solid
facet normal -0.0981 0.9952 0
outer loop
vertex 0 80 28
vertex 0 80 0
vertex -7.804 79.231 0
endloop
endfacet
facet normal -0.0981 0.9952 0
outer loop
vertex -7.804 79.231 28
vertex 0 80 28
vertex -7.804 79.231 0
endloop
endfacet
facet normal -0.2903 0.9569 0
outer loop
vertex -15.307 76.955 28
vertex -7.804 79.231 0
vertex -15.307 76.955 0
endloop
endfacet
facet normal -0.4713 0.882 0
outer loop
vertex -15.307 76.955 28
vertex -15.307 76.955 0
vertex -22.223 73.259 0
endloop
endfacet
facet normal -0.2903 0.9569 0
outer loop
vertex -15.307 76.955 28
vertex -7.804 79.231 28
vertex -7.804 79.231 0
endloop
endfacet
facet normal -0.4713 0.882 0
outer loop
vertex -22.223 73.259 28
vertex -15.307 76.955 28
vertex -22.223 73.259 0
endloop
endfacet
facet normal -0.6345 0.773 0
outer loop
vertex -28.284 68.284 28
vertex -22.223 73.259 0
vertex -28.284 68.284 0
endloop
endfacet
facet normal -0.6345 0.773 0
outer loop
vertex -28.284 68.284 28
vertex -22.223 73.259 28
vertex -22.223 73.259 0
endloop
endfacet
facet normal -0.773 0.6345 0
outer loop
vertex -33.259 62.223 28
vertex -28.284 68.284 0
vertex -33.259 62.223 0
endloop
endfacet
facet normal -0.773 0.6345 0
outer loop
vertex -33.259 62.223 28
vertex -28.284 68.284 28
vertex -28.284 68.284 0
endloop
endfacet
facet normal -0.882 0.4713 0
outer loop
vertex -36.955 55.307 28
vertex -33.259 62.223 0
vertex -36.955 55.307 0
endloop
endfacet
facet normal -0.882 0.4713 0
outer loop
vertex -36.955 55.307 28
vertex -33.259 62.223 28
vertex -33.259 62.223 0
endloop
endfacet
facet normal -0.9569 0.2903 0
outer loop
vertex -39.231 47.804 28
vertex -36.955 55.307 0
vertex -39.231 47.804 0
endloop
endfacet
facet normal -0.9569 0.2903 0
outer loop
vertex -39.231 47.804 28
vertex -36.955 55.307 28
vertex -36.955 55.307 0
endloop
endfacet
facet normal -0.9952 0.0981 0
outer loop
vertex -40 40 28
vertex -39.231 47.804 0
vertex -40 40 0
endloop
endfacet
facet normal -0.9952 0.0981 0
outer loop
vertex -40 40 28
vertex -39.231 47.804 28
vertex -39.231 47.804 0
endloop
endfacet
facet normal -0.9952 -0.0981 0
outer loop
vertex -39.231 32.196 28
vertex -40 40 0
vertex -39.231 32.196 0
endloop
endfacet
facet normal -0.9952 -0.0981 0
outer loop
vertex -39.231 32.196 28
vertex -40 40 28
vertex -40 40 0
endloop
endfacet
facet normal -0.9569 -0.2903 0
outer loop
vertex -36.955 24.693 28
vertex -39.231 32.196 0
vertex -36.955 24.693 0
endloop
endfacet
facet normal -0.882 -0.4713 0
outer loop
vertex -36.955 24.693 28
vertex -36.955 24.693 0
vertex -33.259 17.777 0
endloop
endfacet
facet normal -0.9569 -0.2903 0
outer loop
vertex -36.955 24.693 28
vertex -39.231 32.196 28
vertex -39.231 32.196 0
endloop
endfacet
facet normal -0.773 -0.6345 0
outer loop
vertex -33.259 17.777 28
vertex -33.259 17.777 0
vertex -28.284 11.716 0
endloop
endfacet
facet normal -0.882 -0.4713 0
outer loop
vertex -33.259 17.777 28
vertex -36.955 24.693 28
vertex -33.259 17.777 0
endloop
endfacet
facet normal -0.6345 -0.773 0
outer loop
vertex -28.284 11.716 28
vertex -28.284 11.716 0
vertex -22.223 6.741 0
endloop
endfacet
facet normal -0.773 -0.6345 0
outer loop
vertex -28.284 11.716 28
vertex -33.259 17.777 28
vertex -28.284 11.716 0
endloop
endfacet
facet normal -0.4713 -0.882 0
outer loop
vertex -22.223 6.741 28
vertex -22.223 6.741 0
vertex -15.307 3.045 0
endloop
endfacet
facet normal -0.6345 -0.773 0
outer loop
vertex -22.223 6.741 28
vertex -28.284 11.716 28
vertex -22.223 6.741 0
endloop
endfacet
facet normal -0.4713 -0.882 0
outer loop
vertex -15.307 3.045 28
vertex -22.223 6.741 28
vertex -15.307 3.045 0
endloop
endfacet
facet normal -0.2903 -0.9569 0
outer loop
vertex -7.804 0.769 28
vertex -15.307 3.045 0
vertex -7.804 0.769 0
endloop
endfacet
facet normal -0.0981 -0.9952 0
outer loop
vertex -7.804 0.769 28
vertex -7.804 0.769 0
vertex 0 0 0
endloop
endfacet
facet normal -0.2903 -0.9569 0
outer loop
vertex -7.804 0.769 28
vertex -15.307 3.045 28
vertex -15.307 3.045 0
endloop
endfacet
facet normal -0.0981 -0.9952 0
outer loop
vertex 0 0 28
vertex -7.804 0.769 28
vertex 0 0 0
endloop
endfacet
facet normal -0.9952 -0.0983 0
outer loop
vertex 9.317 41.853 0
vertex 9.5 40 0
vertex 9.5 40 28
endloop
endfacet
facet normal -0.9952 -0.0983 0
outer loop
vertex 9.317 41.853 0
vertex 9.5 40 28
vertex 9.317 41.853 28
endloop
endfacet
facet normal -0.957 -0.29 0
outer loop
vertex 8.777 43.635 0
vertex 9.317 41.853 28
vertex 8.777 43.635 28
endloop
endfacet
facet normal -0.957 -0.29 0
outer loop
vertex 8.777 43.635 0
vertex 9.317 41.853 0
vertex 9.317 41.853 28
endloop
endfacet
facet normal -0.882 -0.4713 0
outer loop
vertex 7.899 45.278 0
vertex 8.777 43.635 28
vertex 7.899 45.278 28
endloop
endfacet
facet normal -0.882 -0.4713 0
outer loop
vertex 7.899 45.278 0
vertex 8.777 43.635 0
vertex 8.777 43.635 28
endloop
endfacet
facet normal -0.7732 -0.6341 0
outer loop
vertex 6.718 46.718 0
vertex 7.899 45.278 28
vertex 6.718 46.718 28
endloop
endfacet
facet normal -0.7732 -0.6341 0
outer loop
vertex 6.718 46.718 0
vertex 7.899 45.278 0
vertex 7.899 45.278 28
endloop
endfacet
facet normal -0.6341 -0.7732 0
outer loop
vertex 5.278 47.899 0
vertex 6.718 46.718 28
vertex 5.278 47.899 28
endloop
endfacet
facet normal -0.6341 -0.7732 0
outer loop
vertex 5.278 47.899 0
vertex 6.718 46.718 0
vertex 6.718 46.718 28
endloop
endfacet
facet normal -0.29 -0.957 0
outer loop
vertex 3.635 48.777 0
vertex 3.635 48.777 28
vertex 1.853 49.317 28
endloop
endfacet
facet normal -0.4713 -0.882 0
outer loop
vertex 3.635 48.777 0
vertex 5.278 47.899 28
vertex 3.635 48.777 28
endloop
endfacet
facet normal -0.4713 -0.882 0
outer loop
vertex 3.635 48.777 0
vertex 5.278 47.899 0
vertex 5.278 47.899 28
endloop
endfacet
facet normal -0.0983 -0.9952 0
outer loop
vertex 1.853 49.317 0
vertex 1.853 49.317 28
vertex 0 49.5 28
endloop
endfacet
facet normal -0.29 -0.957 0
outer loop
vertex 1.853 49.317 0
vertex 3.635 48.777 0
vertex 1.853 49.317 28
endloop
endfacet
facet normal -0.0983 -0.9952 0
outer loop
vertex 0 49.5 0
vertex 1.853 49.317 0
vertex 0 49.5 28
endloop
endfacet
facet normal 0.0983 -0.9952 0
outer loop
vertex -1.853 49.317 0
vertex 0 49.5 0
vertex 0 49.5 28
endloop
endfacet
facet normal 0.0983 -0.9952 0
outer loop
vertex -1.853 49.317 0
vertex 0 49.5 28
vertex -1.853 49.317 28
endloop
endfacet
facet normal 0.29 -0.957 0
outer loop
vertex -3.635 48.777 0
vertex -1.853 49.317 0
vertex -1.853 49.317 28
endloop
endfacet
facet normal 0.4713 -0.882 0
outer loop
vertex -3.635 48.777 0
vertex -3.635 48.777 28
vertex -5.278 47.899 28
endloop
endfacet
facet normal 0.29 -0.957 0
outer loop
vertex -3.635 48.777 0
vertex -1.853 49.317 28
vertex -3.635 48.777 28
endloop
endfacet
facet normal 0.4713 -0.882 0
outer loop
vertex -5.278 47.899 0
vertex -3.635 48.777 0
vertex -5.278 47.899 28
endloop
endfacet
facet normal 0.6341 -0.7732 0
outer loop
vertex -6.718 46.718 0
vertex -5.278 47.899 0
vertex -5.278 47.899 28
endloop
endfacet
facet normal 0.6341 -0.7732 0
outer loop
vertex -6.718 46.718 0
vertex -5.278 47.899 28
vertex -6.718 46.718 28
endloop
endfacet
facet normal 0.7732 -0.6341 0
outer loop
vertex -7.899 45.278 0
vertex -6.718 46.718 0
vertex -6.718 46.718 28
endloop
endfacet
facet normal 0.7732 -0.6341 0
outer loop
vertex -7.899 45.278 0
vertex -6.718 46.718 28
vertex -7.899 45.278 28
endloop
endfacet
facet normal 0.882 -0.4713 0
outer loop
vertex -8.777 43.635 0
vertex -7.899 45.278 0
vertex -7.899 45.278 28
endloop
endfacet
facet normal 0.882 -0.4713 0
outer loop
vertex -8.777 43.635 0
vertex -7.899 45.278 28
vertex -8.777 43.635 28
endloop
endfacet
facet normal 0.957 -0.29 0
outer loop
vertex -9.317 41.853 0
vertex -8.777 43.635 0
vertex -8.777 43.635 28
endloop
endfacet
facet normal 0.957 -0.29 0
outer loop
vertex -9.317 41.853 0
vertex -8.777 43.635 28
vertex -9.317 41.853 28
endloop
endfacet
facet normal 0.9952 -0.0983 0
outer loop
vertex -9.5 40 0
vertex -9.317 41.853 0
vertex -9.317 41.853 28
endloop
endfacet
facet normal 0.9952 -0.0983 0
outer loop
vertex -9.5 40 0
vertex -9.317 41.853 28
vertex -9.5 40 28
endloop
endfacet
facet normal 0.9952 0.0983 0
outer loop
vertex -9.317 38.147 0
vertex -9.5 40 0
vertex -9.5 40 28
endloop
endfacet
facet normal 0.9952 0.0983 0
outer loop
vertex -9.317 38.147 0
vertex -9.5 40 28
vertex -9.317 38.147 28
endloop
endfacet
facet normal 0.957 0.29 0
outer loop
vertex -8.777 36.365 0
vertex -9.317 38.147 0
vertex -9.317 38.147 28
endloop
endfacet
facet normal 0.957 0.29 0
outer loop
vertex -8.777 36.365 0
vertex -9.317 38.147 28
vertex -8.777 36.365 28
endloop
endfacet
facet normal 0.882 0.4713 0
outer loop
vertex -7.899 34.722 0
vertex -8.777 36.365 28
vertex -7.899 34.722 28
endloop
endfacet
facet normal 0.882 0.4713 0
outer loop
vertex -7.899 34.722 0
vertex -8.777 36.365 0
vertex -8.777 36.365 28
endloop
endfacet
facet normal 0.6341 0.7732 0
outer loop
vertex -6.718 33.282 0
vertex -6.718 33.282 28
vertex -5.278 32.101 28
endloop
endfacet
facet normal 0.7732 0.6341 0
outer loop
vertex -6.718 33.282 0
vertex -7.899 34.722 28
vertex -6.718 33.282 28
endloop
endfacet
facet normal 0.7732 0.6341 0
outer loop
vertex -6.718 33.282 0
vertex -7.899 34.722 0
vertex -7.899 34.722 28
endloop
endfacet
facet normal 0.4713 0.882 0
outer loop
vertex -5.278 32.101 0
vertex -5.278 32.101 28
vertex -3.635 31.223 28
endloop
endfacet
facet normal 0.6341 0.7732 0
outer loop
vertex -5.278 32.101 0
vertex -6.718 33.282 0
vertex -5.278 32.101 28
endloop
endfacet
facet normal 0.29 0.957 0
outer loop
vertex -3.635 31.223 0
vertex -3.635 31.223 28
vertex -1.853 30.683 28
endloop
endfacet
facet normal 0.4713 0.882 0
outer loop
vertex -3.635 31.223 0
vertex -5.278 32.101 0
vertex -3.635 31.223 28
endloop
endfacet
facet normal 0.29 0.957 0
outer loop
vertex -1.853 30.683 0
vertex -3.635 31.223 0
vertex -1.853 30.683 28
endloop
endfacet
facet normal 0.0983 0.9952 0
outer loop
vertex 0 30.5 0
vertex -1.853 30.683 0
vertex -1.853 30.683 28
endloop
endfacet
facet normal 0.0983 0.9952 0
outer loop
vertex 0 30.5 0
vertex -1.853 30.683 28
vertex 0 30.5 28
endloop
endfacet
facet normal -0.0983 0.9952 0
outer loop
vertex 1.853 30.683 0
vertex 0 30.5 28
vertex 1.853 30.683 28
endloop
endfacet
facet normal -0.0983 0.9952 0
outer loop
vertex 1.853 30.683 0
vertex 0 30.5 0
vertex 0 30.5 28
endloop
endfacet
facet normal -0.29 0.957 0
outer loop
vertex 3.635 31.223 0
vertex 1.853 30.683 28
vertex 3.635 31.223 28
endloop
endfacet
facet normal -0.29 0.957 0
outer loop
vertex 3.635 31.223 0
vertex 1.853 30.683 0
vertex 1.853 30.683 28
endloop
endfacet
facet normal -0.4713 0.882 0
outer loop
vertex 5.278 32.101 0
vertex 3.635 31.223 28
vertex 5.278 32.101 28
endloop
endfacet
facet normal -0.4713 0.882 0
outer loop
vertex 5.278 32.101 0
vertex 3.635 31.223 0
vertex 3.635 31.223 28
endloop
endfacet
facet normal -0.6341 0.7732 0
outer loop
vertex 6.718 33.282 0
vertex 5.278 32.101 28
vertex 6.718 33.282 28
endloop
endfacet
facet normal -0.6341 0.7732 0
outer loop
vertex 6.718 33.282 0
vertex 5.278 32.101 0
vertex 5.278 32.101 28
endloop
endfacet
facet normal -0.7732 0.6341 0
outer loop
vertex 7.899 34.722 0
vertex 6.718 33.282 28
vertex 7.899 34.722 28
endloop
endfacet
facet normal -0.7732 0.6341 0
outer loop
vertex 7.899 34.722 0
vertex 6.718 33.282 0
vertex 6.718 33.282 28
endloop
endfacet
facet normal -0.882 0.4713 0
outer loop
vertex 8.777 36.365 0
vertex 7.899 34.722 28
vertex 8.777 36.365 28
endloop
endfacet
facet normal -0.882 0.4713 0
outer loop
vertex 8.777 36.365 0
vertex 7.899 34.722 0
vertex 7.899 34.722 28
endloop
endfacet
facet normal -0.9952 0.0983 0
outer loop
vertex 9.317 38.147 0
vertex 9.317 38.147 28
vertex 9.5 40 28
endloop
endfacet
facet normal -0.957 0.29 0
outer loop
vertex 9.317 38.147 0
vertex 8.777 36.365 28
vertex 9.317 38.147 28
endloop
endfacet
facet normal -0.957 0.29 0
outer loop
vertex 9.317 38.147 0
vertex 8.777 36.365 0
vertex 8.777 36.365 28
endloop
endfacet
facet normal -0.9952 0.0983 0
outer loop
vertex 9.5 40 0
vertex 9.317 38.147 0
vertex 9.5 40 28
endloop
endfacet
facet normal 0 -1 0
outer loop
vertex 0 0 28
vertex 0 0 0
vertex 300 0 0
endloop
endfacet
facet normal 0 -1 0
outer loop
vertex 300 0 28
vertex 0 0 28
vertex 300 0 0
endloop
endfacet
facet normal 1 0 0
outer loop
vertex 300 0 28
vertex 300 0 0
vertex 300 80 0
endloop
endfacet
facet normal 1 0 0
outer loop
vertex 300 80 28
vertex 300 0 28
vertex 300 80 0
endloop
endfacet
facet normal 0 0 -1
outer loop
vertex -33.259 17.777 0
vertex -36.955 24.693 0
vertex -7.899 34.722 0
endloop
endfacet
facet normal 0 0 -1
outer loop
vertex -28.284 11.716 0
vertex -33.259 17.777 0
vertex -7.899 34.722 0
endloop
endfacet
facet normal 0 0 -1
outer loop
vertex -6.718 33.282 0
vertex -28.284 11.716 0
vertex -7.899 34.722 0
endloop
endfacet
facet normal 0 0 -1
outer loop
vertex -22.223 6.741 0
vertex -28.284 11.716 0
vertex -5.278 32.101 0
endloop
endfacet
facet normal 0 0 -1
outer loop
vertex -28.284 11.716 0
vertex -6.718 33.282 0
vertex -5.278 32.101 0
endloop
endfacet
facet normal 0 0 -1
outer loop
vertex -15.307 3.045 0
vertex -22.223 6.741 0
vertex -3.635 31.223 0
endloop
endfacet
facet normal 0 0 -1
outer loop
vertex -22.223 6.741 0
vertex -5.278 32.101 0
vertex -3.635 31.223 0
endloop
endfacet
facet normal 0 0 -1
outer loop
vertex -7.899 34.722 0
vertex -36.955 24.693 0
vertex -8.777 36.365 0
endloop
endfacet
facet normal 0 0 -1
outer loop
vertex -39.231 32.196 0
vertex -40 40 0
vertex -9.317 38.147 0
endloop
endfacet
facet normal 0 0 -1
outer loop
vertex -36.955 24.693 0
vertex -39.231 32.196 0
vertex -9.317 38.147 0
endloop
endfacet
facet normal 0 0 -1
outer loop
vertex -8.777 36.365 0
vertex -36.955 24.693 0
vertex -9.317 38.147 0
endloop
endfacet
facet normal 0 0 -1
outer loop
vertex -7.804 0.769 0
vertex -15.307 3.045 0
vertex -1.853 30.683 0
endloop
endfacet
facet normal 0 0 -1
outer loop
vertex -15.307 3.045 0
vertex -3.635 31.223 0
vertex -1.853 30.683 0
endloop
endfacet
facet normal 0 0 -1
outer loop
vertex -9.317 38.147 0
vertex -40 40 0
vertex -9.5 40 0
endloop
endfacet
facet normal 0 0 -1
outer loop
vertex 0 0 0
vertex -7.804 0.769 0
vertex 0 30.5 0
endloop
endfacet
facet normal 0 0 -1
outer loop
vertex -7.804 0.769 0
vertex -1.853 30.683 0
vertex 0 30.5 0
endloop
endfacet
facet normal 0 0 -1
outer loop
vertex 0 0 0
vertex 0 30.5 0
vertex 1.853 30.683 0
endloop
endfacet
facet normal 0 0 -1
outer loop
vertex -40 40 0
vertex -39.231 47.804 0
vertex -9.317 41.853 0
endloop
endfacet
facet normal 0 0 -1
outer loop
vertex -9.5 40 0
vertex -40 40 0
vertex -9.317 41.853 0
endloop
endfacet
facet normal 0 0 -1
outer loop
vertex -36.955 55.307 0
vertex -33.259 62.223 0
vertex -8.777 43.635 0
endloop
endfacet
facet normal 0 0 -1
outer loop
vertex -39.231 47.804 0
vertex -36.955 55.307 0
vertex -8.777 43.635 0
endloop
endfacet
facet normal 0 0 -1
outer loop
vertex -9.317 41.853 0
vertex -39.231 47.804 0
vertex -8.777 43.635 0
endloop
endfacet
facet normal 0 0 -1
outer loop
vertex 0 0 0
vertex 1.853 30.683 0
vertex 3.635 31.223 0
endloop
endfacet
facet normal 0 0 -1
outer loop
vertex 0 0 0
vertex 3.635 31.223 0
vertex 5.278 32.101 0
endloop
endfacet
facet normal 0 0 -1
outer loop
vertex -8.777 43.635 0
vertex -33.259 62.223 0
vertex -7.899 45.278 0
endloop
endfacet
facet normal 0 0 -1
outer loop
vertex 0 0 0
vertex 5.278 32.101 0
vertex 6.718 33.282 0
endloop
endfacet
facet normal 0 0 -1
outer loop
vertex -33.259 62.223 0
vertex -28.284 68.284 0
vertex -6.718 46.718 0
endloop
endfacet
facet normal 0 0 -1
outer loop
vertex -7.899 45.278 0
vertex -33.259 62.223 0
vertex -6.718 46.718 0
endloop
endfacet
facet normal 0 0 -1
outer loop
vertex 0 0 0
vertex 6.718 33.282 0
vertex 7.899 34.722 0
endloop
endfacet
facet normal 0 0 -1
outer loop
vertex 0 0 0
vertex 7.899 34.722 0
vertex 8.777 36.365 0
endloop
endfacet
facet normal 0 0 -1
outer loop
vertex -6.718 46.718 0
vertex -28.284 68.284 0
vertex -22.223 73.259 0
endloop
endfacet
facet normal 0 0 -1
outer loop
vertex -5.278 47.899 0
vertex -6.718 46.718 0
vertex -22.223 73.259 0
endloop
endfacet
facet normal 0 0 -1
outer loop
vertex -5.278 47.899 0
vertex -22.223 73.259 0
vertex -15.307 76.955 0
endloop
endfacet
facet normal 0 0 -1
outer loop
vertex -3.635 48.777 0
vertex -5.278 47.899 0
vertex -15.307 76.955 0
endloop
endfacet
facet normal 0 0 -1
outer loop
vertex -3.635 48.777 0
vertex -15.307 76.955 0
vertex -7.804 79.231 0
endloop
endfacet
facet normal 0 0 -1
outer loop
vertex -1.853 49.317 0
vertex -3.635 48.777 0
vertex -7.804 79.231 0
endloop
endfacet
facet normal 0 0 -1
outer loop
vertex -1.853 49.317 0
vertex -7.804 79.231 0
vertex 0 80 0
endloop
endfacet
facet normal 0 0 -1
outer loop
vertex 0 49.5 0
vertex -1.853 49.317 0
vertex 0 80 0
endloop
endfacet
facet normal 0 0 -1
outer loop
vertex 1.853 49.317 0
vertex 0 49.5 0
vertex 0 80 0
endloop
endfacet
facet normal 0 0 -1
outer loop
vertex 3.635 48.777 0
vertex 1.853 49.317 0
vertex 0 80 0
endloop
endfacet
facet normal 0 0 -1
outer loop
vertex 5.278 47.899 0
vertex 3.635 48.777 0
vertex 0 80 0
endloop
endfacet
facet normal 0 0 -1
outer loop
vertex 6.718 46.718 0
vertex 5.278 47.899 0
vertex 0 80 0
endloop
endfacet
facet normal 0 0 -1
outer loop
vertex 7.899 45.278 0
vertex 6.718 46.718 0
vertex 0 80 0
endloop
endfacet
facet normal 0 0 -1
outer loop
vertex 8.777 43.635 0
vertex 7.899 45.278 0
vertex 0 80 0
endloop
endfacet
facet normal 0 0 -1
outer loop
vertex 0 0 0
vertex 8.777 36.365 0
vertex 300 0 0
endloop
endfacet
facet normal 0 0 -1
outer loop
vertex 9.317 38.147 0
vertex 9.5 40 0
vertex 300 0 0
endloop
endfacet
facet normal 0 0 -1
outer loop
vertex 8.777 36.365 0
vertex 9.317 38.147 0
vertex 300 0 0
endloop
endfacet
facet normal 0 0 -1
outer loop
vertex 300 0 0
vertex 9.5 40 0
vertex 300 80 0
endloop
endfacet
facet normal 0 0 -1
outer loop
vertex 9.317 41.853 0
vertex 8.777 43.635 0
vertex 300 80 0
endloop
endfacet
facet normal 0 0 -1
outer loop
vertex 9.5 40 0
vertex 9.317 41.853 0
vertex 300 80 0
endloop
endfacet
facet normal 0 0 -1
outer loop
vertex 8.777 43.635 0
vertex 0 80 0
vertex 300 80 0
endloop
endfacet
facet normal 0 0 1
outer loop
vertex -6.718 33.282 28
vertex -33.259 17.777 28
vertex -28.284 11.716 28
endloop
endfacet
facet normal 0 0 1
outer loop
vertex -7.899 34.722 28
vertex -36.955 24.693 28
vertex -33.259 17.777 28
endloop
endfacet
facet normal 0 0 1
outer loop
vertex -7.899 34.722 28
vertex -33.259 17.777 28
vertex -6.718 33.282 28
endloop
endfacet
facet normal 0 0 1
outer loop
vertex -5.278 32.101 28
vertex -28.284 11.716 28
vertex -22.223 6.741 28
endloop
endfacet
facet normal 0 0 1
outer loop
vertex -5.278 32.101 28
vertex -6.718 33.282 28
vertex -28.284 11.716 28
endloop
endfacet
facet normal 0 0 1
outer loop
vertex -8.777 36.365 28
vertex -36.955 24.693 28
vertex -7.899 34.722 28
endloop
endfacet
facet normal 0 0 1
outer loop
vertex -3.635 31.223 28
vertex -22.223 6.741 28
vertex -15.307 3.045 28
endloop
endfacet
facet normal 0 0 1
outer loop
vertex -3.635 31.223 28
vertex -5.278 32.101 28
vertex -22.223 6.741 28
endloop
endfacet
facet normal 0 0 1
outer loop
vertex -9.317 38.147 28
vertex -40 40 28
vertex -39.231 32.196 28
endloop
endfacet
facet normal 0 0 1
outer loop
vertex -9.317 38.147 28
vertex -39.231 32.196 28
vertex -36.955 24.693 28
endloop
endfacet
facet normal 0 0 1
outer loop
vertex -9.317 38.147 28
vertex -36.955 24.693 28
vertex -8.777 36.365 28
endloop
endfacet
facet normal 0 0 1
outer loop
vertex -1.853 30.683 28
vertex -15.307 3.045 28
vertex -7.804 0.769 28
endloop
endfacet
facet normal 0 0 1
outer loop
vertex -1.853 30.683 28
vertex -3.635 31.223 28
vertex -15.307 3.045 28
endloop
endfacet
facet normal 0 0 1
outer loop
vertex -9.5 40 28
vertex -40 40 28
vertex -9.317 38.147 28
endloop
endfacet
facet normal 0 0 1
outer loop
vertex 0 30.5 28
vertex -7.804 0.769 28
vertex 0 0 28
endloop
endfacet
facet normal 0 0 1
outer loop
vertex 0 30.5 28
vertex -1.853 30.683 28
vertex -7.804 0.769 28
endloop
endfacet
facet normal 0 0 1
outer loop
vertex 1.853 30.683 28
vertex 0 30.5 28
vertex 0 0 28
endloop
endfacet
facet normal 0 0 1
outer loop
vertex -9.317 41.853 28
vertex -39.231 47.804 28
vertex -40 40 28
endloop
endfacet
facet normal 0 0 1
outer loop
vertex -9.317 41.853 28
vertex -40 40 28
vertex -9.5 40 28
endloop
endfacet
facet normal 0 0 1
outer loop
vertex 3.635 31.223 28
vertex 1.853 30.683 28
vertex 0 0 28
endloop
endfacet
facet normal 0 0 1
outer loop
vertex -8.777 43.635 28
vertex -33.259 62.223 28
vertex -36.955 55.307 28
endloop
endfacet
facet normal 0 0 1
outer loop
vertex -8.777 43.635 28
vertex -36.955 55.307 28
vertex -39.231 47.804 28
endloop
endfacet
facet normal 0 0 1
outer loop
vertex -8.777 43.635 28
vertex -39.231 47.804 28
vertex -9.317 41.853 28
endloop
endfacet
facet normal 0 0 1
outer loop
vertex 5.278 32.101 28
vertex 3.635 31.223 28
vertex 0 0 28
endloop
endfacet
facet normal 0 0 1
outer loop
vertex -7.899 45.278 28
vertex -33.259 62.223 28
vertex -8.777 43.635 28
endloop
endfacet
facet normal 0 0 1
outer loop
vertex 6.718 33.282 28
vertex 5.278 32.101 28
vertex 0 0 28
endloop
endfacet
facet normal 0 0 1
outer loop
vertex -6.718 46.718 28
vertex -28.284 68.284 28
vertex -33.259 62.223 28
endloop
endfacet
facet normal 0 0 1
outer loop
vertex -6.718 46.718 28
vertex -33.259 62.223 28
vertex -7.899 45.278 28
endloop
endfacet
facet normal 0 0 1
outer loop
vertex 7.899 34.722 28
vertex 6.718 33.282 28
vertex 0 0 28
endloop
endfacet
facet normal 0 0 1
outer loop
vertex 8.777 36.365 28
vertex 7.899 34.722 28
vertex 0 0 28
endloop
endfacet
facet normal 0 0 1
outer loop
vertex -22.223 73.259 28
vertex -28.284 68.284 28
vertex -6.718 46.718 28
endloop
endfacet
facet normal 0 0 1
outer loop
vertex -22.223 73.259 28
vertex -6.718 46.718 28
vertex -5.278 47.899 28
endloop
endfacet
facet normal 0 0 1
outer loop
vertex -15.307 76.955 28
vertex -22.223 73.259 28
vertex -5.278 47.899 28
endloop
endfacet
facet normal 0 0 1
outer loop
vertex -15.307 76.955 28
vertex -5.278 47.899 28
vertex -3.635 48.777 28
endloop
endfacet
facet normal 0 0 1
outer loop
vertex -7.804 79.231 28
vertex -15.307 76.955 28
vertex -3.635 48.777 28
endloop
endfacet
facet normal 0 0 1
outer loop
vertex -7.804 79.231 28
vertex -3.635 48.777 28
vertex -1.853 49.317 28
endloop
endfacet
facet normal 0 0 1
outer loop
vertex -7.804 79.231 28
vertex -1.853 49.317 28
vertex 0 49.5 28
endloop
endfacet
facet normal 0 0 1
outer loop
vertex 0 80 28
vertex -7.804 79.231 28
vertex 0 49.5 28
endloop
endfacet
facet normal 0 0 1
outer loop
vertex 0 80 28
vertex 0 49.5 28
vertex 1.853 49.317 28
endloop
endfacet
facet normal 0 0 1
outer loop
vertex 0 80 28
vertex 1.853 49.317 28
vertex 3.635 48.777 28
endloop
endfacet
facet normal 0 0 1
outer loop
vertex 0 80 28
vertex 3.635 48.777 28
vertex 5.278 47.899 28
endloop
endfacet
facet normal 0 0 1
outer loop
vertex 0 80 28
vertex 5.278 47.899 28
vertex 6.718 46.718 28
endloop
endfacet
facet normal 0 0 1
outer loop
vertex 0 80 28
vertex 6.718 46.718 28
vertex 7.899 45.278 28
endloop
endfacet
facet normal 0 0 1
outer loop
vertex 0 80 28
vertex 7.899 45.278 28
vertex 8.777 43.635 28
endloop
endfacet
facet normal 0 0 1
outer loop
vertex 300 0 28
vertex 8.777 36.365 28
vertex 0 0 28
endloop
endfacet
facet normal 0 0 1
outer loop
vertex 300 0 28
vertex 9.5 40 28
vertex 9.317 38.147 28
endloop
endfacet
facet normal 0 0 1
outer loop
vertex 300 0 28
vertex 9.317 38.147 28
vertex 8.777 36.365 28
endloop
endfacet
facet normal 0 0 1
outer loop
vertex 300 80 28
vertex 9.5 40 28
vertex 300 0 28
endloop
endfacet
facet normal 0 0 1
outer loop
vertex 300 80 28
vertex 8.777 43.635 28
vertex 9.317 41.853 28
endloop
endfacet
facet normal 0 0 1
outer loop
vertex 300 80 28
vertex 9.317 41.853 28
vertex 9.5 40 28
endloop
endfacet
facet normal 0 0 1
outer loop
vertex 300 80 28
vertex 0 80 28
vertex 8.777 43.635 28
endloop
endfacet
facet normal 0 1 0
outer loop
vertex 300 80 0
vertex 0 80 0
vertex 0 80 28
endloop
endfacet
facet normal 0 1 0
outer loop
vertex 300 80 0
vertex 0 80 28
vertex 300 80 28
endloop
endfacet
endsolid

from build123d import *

# Parameters (mm, degrees)
SKETCH1_W               = 300
SKETCH1_H               = 80
BOSS_EXTRUDE1_DEPTH     = 28
SKETCH2_R               = 40
BOSS_EXTRUDE2_DEPTH     = 28
CUT_EXTRUDE2_DEPTH      = 312.743484294
CUT_EXTRUDE2_DEPTH_BACK = 312.743484294
SKETCH3_R               = 9.5


with BuildPart() as part:
    # Sketch1 → Boss-Extrude1 (new body)
    with BuildSketch(Plane.XY):
        with Locations((150, 40)):
            Rectangle(SKETCH1_W, SKETCH1_H)
    extrude(amount=BOSS_EXTRUDE1_DEPTH)

    # Sketch2 → Boss-Extrude2 (add)
    with BuildSketch(Plane.XY.offset(28)):
        with Locations((0, 40)):
            Circle(SKETCH2_R)
    extrude(amount=-BOSS_EXTRUDE2_DEPTH)

    # Sketch3 → Cut-Extrude2 (cut, two sides: drawn at the far end of the back side and taken through both)
    with BuildSketch(Plane.XY.offset(28).offset(-CUT_EXTRUDE2_DEPTH_BACK)):
        with Locations((0, 40)):
            Circle(SKETCH3_R)
    extrude(amount=CUT_EXTRUDE2_DEPTH + CUT_EXTRUDE2_DEPTH_BACK, mode=Mode.SUBTRACT)


solid = part.part
